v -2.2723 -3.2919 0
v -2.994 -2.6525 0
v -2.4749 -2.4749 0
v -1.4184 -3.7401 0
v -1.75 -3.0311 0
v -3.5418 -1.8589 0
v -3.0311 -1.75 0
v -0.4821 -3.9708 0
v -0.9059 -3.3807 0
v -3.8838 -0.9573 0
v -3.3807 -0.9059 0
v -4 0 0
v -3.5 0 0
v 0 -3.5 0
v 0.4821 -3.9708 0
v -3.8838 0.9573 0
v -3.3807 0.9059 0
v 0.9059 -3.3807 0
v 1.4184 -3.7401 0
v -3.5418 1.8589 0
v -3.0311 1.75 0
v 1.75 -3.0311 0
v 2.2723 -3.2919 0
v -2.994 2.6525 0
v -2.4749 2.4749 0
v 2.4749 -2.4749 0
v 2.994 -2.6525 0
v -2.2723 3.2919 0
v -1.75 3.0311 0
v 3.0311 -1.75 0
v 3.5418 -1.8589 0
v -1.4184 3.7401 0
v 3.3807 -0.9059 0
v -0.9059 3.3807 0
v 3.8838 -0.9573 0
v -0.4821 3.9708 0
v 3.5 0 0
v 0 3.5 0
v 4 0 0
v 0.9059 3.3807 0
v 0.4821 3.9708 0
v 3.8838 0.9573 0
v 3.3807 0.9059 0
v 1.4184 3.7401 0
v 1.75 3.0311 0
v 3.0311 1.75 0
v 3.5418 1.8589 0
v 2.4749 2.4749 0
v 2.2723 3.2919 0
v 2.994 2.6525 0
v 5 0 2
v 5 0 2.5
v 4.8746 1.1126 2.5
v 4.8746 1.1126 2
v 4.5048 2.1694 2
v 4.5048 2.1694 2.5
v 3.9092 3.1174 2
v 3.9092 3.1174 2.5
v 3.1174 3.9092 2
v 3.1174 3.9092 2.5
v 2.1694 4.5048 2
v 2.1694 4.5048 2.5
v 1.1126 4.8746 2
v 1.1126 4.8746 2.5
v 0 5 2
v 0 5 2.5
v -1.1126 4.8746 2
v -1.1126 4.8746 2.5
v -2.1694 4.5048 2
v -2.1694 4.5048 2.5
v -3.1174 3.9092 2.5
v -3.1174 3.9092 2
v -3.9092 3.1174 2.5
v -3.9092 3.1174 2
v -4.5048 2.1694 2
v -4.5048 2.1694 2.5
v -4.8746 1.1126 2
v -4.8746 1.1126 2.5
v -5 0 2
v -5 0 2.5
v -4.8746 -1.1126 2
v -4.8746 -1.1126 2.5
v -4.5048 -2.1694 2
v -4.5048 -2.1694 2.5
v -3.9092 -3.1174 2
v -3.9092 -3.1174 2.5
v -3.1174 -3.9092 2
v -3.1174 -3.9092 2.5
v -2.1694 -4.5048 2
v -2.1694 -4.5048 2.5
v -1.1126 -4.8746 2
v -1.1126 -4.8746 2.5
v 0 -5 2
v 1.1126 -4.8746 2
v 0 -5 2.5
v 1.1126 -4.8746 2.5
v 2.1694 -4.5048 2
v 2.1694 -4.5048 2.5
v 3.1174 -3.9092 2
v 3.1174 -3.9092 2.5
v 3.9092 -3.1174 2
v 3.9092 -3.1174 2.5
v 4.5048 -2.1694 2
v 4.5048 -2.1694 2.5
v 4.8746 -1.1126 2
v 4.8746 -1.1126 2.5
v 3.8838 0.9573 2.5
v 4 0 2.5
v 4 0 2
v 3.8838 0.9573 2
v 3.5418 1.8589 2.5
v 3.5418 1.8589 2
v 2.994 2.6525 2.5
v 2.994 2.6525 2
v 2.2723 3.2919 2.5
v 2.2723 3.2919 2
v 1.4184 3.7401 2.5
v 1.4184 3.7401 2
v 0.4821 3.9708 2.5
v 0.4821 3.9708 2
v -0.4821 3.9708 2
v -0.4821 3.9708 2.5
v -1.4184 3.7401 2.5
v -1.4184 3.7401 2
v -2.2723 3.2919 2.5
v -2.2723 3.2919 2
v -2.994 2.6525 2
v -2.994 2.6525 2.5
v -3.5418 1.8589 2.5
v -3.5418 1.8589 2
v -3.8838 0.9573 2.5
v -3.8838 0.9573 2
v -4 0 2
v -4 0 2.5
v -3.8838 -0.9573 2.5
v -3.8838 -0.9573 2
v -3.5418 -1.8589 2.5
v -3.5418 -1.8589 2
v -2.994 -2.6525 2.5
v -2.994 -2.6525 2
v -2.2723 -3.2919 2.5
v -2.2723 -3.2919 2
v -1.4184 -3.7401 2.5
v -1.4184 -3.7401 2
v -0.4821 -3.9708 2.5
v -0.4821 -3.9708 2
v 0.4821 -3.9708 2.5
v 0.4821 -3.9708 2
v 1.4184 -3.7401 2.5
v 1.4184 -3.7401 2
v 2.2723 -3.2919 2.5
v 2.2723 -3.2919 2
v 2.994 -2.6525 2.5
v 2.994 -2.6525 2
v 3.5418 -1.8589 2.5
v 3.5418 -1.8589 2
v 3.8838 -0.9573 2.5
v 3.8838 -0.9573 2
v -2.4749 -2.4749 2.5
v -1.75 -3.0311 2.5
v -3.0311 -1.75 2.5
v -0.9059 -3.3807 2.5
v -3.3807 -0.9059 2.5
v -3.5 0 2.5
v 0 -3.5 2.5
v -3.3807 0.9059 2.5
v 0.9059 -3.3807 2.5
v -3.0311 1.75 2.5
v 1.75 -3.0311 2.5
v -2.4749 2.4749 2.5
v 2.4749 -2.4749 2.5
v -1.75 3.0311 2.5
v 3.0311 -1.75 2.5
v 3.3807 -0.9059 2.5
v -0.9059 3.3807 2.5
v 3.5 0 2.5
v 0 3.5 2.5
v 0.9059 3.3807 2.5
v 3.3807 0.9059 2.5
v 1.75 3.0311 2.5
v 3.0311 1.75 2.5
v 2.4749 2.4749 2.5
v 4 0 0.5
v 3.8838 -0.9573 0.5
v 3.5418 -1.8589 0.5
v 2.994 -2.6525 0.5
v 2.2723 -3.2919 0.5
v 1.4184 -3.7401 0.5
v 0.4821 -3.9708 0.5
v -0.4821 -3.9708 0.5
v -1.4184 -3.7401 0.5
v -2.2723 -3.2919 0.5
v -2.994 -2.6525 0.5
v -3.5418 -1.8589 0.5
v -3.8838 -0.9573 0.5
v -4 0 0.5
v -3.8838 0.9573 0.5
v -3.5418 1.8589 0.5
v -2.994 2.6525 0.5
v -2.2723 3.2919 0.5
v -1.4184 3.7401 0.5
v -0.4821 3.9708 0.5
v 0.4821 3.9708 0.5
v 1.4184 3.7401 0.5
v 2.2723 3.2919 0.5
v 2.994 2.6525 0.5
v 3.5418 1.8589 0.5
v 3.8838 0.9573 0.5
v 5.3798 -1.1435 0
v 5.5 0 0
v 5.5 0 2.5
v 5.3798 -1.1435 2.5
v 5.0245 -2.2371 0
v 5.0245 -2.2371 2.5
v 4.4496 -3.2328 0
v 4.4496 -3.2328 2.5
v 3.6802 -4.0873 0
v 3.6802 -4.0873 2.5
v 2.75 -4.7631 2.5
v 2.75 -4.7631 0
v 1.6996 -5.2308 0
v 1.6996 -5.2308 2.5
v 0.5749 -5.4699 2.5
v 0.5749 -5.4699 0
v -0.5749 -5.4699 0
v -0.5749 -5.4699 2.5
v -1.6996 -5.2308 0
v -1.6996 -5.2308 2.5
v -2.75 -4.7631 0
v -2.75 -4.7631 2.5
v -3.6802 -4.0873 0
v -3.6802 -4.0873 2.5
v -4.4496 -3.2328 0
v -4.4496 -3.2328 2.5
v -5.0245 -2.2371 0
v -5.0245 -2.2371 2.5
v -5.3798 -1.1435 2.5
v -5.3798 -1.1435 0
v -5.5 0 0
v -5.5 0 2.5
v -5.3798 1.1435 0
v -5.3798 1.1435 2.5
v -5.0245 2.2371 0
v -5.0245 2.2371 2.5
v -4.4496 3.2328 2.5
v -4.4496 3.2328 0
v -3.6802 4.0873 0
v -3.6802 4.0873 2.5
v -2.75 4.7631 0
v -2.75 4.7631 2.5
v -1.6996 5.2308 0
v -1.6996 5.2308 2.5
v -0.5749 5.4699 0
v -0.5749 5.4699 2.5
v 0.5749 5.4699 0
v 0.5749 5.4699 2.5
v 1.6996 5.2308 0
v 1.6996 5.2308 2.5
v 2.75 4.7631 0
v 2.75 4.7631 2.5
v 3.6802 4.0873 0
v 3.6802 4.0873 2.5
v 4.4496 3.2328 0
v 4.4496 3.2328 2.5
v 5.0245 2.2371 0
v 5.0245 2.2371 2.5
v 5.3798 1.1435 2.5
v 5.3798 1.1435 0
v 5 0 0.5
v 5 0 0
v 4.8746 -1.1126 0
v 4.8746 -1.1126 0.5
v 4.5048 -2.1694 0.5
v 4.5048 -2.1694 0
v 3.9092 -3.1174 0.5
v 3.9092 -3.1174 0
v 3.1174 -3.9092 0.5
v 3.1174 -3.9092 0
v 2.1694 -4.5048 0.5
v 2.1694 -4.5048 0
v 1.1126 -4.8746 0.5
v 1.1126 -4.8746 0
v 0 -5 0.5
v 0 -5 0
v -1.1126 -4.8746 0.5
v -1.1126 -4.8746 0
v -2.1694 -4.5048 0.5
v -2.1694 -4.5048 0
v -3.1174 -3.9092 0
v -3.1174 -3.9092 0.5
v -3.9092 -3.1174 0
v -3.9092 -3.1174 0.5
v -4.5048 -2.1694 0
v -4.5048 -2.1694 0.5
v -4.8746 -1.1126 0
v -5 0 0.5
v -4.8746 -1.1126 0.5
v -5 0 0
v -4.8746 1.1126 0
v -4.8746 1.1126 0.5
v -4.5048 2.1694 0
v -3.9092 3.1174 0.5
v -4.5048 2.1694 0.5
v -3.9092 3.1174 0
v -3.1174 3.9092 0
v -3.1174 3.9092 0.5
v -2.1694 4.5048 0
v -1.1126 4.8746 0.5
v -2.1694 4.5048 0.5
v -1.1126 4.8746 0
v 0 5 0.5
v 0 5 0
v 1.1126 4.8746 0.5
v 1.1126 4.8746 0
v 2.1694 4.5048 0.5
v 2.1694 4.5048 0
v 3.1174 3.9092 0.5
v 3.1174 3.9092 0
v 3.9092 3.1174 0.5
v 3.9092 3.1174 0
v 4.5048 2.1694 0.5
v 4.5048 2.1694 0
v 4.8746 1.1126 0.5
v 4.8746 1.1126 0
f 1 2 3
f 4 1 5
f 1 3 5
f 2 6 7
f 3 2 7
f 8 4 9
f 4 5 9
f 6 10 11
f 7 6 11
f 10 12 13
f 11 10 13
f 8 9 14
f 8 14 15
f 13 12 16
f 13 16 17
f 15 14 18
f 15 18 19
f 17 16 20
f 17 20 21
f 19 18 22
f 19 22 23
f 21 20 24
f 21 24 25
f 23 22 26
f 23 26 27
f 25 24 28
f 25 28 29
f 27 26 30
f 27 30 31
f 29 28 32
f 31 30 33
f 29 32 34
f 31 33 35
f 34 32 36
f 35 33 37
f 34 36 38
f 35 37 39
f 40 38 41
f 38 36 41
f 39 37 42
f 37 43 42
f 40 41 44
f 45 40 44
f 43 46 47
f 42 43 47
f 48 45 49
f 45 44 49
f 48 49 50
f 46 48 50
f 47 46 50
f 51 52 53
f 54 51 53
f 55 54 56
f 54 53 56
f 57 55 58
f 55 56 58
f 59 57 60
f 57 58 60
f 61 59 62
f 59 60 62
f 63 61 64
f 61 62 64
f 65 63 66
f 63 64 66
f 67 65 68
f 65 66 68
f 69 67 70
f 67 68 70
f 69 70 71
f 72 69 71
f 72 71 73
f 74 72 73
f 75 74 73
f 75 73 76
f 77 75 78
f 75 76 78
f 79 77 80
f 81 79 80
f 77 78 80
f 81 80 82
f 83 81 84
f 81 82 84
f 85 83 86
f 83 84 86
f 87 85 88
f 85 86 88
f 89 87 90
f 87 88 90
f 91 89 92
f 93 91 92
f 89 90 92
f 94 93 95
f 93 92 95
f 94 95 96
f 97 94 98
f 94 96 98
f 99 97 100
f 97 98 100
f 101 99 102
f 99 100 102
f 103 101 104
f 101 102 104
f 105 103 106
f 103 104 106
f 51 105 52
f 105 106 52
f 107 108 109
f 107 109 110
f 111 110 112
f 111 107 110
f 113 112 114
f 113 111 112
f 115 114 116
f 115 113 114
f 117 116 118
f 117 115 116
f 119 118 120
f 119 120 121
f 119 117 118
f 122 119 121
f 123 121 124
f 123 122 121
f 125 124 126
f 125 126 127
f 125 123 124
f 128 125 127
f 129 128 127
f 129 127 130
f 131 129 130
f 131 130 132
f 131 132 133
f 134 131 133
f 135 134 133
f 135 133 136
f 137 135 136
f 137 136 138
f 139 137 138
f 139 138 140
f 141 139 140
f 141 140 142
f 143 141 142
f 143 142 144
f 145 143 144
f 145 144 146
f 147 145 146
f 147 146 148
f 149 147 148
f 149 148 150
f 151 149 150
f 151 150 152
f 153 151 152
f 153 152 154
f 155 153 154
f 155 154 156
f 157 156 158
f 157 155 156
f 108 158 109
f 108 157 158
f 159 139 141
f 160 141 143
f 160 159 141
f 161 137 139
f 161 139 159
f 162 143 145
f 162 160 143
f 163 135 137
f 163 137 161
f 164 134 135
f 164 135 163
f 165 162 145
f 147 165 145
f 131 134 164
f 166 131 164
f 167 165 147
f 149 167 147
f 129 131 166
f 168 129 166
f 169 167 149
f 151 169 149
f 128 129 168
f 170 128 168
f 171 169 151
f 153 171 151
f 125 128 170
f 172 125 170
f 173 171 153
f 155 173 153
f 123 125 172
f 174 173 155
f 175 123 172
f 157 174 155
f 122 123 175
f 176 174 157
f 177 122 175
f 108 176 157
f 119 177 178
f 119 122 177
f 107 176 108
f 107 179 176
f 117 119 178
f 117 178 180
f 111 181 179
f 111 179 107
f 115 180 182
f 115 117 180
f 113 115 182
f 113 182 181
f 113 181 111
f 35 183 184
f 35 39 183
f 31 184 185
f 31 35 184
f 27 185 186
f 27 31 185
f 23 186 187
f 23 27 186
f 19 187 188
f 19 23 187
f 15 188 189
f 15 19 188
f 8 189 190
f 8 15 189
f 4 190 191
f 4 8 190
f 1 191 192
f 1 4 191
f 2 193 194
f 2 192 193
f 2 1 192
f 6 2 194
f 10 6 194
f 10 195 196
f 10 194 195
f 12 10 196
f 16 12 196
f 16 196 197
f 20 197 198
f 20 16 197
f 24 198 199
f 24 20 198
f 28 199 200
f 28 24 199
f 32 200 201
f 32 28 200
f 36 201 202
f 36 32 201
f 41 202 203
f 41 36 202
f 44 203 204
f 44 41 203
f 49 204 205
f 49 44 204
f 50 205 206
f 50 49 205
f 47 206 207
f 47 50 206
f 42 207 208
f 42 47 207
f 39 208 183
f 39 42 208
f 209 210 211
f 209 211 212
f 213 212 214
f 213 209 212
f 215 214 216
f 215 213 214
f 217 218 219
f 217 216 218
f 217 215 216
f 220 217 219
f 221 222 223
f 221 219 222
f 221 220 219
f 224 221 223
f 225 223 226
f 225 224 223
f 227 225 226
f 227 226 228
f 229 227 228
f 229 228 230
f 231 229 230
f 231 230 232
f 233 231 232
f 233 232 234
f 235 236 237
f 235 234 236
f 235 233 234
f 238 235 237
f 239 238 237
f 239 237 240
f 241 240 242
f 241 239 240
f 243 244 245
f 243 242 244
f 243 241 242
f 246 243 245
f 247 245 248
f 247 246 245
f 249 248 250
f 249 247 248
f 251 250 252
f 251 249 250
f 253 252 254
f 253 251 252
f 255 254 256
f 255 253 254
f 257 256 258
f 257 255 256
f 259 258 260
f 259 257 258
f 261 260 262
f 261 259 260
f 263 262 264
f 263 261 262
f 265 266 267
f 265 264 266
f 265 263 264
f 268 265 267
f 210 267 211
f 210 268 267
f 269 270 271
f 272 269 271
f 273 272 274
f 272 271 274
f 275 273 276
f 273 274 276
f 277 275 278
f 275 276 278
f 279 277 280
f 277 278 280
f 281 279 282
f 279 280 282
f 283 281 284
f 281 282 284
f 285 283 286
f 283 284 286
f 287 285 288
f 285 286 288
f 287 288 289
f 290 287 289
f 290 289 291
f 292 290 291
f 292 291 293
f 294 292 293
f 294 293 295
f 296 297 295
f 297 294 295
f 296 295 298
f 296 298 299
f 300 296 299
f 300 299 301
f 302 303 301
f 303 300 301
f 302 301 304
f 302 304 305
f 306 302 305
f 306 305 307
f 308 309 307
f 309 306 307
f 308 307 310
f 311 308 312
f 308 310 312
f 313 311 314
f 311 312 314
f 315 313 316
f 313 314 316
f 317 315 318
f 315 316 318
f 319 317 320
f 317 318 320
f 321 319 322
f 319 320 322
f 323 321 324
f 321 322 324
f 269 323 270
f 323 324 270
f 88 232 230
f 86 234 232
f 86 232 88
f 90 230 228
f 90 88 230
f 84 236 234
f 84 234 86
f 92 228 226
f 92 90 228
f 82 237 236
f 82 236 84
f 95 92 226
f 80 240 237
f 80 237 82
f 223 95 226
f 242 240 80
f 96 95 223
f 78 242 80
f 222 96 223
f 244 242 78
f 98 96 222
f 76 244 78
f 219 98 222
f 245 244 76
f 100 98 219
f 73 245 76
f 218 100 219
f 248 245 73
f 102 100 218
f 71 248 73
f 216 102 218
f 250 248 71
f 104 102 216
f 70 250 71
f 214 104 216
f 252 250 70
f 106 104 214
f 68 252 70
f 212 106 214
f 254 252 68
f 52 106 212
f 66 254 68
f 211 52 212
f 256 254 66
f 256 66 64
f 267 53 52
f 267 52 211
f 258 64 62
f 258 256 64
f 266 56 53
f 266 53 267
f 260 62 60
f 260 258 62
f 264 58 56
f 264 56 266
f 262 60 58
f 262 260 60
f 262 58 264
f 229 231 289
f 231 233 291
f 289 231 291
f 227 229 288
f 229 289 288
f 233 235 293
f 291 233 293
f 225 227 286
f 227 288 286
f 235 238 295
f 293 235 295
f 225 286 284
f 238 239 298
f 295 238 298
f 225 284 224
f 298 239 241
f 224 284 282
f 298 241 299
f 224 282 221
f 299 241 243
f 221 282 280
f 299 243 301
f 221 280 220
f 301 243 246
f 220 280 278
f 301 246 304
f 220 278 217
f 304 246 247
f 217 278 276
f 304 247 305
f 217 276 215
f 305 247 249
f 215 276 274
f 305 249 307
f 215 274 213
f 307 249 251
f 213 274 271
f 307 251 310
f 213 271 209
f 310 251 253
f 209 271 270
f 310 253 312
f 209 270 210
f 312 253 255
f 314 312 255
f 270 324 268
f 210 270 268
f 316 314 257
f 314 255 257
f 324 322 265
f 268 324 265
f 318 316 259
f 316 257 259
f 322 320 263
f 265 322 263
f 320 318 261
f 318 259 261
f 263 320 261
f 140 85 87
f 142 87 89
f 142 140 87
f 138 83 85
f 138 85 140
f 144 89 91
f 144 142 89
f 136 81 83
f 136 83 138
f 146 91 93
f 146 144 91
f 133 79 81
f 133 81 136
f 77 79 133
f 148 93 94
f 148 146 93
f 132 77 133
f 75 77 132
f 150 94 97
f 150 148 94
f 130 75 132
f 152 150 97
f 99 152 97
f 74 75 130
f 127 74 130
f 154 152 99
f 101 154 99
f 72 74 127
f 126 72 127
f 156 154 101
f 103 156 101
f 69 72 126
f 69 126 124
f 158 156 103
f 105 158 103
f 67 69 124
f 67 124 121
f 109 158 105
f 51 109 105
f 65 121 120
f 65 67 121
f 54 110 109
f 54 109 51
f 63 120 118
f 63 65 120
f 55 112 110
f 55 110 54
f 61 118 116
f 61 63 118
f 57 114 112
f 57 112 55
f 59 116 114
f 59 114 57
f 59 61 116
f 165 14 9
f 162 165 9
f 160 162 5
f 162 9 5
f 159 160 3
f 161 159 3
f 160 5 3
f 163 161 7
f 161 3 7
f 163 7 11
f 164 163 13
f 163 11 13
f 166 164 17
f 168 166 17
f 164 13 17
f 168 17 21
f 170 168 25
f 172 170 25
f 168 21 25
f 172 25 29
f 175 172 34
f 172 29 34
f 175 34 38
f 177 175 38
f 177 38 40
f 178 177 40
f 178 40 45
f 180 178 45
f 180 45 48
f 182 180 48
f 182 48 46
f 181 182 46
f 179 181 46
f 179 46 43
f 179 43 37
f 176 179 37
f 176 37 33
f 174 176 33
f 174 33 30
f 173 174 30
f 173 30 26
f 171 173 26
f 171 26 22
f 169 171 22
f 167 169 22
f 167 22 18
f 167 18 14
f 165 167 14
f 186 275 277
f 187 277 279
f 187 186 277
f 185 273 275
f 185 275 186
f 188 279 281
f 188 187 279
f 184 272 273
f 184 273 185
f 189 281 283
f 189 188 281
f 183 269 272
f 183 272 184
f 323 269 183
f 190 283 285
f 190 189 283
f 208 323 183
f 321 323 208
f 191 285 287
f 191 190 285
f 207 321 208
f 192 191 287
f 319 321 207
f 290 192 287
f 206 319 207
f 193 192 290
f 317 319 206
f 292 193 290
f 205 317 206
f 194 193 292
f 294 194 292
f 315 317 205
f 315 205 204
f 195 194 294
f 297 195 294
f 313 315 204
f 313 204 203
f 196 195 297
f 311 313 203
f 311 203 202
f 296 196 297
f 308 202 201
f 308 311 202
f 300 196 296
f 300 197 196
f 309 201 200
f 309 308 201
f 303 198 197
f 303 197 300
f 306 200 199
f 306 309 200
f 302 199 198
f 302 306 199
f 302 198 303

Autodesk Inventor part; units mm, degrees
ref_plane "YZ Plane" through (0, 0, 0) normal (1, 0, 0) x (0, 1, 0)
ref_plane "XZ Plane" through (0, 0, 0) normal (0, 1, 0) x (-1, 0, 0)
sketch "Sketch1" plane through (0, 0, 0) normal (0, 0, 1) x (1, 0, 0)
  circle A0 centre (0, 0) radius 5.5
  dimension "d0" = 11
extrude "Extrusion1" add sketch "Sketch1" along normal blind 2.5
hole "Hole1" at (0, 0, 2.5) direction (0, 0, -1) diameter 7 end through all
sketch "Sketch2" plane through (0, 0, 2.5) normal (0, 0, 1) x (1, 0, 0)
  circle A0 centre (0, 0) radius 5
  circle A1 centre (0, 0) radius 4
  dimension "d12" = 10
  dimension "d13" = 8
extrude "Extrusion2" cut sketch "Sketch2" against normal blind 0.5
ref_plane "Work Plane1" through (0, 0, 1.25) normal (0, 0, 1) x (1, 0, 0)
mirror "Mirror1" about plane through (0, 0, 1.25) normal (0, 0, 1) of "Extrusion2"
properties part number "bearing_7x11x2,5" material "Stainless Steel"
